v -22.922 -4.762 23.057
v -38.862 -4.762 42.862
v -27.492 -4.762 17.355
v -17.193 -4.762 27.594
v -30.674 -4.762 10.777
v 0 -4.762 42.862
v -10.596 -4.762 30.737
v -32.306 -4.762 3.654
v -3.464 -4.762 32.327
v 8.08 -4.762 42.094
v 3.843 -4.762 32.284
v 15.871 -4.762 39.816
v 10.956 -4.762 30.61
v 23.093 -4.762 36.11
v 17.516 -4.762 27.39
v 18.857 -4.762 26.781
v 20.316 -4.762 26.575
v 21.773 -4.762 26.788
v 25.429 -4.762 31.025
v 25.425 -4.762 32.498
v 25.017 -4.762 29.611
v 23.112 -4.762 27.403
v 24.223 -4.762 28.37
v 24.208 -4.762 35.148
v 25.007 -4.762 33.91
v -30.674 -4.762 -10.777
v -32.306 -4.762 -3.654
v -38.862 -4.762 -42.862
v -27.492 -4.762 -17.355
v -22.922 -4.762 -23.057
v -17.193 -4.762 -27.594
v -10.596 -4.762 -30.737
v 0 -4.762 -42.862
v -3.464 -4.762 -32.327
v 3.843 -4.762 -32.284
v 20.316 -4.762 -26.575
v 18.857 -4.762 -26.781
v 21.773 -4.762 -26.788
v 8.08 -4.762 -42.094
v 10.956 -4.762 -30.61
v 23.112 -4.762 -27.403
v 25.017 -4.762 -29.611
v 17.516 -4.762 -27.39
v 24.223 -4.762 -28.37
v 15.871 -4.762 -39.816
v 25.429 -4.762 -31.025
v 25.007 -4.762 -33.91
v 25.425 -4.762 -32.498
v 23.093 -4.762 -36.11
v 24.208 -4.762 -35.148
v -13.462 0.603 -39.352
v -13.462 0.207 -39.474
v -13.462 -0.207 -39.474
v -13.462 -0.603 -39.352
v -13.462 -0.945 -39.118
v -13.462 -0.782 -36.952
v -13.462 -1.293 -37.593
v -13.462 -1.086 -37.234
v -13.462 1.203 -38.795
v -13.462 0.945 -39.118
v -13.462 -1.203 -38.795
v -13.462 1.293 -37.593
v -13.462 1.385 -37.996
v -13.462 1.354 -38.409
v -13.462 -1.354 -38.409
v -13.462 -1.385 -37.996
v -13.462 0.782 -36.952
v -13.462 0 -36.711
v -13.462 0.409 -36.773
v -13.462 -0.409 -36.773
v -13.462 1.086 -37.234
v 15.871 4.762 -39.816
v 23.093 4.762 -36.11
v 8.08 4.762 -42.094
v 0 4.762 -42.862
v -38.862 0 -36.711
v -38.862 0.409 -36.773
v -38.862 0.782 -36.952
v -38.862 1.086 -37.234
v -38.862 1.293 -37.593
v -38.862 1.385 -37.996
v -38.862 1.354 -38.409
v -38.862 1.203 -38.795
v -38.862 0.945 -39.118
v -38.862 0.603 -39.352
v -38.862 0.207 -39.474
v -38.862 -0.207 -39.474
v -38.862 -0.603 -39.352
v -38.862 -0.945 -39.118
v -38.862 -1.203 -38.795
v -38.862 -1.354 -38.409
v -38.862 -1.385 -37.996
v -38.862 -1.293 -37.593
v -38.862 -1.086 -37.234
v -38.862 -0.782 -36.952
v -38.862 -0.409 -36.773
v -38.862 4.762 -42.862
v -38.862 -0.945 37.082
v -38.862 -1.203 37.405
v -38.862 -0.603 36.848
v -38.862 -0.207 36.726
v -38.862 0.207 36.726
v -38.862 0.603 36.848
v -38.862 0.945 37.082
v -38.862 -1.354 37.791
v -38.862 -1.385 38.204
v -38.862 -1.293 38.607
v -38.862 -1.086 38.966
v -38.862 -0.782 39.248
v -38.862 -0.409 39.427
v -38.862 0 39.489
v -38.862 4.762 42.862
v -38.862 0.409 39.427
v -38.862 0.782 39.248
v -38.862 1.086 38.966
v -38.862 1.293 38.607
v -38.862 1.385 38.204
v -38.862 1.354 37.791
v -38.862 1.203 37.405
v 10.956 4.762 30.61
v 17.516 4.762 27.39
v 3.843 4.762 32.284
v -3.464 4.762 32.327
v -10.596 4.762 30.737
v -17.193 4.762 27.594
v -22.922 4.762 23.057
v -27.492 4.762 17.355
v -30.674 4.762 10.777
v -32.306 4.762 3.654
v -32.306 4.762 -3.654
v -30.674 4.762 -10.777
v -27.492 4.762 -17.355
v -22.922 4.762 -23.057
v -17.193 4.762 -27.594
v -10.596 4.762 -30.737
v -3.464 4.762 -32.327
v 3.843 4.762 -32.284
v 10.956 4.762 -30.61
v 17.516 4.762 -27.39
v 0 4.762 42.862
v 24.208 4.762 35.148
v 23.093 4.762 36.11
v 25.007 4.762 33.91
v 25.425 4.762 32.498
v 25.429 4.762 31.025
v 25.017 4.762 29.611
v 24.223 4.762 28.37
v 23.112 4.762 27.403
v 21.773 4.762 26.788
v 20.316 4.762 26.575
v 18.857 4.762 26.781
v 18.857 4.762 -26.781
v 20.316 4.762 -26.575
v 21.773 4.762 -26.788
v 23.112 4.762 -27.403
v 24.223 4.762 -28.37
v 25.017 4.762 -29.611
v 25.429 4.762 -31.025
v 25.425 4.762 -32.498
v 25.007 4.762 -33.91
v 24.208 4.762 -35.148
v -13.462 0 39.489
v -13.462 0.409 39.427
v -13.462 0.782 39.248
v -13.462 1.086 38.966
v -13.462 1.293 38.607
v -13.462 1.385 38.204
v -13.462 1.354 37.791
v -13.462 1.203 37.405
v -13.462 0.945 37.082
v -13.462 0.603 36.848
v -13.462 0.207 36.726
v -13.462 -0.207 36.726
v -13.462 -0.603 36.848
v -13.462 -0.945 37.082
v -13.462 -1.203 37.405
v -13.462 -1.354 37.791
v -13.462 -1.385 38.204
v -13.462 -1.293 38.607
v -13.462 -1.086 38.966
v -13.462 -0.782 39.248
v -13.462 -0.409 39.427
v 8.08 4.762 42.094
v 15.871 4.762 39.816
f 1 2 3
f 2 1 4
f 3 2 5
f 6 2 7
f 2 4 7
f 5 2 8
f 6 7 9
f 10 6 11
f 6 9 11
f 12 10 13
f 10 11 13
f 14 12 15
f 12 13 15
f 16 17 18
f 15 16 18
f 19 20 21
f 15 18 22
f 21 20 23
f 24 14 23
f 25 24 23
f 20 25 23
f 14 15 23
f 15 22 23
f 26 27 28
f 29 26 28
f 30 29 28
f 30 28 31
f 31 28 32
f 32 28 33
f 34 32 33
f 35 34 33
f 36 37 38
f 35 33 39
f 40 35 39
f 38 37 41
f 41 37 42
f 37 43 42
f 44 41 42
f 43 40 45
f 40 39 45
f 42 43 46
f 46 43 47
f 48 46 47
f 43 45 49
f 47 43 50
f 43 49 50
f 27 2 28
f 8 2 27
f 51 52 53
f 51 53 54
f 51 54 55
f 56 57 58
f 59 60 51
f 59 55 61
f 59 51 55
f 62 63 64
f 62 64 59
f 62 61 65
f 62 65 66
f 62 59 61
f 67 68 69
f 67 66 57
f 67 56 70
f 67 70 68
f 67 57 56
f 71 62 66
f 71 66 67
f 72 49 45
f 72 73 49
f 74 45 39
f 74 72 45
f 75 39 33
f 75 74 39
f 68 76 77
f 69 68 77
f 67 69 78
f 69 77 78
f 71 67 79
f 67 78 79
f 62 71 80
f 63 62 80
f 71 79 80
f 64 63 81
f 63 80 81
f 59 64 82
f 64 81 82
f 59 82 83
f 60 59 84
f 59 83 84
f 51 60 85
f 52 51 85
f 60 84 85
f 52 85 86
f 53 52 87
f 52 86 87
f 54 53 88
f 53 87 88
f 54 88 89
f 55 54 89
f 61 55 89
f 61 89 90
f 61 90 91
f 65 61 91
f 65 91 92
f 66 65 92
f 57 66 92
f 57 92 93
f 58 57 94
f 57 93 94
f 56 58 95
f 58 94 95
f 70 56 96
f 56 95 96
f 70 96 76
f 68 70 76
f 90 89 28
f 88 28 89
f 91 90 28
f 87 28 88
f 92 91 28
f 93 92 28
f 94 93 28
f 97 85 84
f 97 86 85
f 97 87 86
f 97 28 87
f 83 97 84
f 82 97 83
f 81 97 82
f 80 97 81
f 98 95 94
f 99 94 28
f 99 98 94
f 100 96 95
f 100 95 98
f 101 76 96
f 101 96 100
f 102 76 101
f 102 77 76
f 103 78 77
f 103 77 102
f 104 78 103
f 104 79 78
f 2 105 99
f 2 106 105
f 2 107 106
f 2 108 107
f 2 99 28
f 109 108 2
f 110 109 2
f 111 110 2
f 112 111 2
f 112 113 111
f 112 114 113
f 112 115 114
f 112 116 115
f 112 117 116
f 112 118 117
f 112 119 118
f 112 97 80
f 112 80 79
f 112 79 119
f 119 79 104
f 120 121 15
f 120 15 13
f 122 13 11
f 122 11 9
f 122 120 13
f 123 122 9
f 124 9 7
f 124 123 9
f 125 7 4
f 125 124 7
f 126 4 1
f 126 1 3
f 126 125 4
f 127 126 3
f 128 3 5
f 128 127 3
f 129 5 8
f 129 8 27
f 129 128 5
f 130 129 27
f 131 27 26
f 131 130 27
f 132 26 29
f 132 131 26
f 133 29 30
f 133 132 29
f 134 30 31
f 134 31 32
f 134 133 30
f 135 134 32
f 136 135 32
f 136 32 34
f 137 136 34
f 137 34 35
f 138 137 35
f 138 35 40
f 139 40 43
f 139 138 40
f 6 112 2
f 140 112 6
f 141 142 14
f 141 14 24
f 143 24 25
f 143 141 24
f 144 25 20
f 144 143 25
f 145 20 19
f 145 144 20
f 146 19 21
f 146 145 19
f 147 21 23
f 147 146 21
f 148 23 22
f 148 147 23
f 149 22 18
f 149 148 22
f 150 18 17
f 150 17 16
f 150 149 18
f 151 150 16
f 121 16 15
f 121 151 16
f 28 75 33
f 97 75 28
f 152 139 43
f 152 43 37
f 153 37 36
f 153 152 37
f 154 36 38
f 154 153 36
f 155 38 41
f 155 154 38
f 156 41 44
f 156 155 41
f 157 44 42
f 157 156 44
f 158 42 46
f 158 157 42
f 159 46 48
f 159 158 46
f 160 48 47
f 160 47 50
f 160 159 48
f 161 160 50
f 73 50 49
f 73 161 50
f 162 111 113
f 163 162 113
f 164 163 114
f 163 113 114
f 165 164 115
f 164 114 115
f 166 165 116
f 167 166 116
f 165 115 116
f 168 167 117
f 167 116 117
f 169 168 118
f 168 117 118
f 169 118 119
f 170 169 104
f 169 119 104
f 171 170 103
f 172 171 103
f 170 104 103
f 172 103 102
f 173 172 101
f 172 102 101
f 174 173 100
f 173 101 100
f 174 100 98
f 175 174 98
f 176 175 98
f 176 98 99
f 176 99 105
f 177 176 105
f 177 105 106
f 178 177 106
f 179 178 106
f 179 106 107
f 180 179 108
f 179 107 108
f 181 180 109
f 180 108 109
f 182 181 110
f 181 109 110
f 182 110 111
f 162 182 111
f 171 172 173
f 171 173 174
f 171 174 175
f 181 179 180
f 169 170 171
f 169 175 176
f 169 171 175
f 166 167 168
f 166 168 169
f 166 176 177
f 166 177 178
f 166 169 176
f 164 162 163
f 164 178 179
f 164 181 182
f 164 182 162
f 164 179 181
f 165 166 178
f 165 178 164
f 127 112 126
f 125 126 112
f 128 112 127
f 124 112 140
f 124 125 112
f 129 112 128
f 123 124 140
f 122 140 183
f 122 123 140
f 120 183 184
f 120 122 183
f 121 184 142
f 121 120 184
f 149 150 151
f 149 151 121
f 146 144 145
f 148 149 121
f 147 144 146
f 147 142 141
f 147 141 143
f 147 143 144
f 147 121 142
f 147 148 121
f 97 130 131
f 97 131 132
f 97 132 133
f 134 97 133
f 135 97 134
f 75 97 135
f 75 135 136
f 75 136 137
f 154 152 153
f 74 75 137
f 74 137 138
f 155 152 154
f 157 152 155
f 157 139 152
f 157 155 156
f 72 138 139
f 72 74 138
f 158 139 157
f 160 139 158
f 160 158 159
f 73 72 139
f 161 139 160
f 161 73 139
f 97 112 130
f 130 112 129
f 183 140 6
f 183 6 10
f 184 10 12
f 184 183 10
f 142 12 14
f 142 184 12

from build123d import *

# Parameters (mm, degrees)
BOSS_EXTRUDE1_DEPTH = 4.7625
SKETCH2_R           = 1.3890625
CUT_EXTRUDE1_DEPTH  = 25.4


with BuildPart() as part:
    # Sketch1 → Boss-Extrude1 (new body, symmetric)
    with BuildSketch(Plane(origin=(0, 0, 0), x_dir=(1, 0, 0), z_dir=(0, 1, 0))):
        with BuildLine():
            Line((-38.862, 42.8625), (-38.862, -42.8625))
            Line((-38.862, -42.8625), (0, -42.8625))
            ThreePointArc((0, -42.8625), (12.029787175, -41.139739022), (23.092554324, -36.109941028))
            ThreePointArc((23.092554324, -36.109941028), (24.664283237, -28.961787885), (17.516130095, -27.390058972))
            ThreePointArc((17.516130095, -27.390058972), (-32.512, 0), (17.516130095, 27.390058972))
            ThreePointArc((17.516130095, 27.390058972), (24.664283237, 28.961787885), (23.092554324, 36.109941028))
            ThreePointArc((23.092554324, 36.109941028), (12.029787175, 41.139739022), (0, 42.8625))
            Line((0, 42.8625), (-38.862, 42.8625))
        make_face()
    extrude(amount=BOSS_EXTRUDE1_DEPTH, both=True)

    # Sketch2 → Cut-Extrude1 (cut)
    with BuildSketch(Plane.ZY.offset(38.862)):
        with Locations((-38.1, 0)):
            Circle(SKETCH2_R)
        with Locations((38.1, 0)):
            Circle(SKETCH2_R)
    extrude(amount=-CUT_EXTRUDE1_DEPTH, mode=Mode.SUBTRACT)


solid = part.part
